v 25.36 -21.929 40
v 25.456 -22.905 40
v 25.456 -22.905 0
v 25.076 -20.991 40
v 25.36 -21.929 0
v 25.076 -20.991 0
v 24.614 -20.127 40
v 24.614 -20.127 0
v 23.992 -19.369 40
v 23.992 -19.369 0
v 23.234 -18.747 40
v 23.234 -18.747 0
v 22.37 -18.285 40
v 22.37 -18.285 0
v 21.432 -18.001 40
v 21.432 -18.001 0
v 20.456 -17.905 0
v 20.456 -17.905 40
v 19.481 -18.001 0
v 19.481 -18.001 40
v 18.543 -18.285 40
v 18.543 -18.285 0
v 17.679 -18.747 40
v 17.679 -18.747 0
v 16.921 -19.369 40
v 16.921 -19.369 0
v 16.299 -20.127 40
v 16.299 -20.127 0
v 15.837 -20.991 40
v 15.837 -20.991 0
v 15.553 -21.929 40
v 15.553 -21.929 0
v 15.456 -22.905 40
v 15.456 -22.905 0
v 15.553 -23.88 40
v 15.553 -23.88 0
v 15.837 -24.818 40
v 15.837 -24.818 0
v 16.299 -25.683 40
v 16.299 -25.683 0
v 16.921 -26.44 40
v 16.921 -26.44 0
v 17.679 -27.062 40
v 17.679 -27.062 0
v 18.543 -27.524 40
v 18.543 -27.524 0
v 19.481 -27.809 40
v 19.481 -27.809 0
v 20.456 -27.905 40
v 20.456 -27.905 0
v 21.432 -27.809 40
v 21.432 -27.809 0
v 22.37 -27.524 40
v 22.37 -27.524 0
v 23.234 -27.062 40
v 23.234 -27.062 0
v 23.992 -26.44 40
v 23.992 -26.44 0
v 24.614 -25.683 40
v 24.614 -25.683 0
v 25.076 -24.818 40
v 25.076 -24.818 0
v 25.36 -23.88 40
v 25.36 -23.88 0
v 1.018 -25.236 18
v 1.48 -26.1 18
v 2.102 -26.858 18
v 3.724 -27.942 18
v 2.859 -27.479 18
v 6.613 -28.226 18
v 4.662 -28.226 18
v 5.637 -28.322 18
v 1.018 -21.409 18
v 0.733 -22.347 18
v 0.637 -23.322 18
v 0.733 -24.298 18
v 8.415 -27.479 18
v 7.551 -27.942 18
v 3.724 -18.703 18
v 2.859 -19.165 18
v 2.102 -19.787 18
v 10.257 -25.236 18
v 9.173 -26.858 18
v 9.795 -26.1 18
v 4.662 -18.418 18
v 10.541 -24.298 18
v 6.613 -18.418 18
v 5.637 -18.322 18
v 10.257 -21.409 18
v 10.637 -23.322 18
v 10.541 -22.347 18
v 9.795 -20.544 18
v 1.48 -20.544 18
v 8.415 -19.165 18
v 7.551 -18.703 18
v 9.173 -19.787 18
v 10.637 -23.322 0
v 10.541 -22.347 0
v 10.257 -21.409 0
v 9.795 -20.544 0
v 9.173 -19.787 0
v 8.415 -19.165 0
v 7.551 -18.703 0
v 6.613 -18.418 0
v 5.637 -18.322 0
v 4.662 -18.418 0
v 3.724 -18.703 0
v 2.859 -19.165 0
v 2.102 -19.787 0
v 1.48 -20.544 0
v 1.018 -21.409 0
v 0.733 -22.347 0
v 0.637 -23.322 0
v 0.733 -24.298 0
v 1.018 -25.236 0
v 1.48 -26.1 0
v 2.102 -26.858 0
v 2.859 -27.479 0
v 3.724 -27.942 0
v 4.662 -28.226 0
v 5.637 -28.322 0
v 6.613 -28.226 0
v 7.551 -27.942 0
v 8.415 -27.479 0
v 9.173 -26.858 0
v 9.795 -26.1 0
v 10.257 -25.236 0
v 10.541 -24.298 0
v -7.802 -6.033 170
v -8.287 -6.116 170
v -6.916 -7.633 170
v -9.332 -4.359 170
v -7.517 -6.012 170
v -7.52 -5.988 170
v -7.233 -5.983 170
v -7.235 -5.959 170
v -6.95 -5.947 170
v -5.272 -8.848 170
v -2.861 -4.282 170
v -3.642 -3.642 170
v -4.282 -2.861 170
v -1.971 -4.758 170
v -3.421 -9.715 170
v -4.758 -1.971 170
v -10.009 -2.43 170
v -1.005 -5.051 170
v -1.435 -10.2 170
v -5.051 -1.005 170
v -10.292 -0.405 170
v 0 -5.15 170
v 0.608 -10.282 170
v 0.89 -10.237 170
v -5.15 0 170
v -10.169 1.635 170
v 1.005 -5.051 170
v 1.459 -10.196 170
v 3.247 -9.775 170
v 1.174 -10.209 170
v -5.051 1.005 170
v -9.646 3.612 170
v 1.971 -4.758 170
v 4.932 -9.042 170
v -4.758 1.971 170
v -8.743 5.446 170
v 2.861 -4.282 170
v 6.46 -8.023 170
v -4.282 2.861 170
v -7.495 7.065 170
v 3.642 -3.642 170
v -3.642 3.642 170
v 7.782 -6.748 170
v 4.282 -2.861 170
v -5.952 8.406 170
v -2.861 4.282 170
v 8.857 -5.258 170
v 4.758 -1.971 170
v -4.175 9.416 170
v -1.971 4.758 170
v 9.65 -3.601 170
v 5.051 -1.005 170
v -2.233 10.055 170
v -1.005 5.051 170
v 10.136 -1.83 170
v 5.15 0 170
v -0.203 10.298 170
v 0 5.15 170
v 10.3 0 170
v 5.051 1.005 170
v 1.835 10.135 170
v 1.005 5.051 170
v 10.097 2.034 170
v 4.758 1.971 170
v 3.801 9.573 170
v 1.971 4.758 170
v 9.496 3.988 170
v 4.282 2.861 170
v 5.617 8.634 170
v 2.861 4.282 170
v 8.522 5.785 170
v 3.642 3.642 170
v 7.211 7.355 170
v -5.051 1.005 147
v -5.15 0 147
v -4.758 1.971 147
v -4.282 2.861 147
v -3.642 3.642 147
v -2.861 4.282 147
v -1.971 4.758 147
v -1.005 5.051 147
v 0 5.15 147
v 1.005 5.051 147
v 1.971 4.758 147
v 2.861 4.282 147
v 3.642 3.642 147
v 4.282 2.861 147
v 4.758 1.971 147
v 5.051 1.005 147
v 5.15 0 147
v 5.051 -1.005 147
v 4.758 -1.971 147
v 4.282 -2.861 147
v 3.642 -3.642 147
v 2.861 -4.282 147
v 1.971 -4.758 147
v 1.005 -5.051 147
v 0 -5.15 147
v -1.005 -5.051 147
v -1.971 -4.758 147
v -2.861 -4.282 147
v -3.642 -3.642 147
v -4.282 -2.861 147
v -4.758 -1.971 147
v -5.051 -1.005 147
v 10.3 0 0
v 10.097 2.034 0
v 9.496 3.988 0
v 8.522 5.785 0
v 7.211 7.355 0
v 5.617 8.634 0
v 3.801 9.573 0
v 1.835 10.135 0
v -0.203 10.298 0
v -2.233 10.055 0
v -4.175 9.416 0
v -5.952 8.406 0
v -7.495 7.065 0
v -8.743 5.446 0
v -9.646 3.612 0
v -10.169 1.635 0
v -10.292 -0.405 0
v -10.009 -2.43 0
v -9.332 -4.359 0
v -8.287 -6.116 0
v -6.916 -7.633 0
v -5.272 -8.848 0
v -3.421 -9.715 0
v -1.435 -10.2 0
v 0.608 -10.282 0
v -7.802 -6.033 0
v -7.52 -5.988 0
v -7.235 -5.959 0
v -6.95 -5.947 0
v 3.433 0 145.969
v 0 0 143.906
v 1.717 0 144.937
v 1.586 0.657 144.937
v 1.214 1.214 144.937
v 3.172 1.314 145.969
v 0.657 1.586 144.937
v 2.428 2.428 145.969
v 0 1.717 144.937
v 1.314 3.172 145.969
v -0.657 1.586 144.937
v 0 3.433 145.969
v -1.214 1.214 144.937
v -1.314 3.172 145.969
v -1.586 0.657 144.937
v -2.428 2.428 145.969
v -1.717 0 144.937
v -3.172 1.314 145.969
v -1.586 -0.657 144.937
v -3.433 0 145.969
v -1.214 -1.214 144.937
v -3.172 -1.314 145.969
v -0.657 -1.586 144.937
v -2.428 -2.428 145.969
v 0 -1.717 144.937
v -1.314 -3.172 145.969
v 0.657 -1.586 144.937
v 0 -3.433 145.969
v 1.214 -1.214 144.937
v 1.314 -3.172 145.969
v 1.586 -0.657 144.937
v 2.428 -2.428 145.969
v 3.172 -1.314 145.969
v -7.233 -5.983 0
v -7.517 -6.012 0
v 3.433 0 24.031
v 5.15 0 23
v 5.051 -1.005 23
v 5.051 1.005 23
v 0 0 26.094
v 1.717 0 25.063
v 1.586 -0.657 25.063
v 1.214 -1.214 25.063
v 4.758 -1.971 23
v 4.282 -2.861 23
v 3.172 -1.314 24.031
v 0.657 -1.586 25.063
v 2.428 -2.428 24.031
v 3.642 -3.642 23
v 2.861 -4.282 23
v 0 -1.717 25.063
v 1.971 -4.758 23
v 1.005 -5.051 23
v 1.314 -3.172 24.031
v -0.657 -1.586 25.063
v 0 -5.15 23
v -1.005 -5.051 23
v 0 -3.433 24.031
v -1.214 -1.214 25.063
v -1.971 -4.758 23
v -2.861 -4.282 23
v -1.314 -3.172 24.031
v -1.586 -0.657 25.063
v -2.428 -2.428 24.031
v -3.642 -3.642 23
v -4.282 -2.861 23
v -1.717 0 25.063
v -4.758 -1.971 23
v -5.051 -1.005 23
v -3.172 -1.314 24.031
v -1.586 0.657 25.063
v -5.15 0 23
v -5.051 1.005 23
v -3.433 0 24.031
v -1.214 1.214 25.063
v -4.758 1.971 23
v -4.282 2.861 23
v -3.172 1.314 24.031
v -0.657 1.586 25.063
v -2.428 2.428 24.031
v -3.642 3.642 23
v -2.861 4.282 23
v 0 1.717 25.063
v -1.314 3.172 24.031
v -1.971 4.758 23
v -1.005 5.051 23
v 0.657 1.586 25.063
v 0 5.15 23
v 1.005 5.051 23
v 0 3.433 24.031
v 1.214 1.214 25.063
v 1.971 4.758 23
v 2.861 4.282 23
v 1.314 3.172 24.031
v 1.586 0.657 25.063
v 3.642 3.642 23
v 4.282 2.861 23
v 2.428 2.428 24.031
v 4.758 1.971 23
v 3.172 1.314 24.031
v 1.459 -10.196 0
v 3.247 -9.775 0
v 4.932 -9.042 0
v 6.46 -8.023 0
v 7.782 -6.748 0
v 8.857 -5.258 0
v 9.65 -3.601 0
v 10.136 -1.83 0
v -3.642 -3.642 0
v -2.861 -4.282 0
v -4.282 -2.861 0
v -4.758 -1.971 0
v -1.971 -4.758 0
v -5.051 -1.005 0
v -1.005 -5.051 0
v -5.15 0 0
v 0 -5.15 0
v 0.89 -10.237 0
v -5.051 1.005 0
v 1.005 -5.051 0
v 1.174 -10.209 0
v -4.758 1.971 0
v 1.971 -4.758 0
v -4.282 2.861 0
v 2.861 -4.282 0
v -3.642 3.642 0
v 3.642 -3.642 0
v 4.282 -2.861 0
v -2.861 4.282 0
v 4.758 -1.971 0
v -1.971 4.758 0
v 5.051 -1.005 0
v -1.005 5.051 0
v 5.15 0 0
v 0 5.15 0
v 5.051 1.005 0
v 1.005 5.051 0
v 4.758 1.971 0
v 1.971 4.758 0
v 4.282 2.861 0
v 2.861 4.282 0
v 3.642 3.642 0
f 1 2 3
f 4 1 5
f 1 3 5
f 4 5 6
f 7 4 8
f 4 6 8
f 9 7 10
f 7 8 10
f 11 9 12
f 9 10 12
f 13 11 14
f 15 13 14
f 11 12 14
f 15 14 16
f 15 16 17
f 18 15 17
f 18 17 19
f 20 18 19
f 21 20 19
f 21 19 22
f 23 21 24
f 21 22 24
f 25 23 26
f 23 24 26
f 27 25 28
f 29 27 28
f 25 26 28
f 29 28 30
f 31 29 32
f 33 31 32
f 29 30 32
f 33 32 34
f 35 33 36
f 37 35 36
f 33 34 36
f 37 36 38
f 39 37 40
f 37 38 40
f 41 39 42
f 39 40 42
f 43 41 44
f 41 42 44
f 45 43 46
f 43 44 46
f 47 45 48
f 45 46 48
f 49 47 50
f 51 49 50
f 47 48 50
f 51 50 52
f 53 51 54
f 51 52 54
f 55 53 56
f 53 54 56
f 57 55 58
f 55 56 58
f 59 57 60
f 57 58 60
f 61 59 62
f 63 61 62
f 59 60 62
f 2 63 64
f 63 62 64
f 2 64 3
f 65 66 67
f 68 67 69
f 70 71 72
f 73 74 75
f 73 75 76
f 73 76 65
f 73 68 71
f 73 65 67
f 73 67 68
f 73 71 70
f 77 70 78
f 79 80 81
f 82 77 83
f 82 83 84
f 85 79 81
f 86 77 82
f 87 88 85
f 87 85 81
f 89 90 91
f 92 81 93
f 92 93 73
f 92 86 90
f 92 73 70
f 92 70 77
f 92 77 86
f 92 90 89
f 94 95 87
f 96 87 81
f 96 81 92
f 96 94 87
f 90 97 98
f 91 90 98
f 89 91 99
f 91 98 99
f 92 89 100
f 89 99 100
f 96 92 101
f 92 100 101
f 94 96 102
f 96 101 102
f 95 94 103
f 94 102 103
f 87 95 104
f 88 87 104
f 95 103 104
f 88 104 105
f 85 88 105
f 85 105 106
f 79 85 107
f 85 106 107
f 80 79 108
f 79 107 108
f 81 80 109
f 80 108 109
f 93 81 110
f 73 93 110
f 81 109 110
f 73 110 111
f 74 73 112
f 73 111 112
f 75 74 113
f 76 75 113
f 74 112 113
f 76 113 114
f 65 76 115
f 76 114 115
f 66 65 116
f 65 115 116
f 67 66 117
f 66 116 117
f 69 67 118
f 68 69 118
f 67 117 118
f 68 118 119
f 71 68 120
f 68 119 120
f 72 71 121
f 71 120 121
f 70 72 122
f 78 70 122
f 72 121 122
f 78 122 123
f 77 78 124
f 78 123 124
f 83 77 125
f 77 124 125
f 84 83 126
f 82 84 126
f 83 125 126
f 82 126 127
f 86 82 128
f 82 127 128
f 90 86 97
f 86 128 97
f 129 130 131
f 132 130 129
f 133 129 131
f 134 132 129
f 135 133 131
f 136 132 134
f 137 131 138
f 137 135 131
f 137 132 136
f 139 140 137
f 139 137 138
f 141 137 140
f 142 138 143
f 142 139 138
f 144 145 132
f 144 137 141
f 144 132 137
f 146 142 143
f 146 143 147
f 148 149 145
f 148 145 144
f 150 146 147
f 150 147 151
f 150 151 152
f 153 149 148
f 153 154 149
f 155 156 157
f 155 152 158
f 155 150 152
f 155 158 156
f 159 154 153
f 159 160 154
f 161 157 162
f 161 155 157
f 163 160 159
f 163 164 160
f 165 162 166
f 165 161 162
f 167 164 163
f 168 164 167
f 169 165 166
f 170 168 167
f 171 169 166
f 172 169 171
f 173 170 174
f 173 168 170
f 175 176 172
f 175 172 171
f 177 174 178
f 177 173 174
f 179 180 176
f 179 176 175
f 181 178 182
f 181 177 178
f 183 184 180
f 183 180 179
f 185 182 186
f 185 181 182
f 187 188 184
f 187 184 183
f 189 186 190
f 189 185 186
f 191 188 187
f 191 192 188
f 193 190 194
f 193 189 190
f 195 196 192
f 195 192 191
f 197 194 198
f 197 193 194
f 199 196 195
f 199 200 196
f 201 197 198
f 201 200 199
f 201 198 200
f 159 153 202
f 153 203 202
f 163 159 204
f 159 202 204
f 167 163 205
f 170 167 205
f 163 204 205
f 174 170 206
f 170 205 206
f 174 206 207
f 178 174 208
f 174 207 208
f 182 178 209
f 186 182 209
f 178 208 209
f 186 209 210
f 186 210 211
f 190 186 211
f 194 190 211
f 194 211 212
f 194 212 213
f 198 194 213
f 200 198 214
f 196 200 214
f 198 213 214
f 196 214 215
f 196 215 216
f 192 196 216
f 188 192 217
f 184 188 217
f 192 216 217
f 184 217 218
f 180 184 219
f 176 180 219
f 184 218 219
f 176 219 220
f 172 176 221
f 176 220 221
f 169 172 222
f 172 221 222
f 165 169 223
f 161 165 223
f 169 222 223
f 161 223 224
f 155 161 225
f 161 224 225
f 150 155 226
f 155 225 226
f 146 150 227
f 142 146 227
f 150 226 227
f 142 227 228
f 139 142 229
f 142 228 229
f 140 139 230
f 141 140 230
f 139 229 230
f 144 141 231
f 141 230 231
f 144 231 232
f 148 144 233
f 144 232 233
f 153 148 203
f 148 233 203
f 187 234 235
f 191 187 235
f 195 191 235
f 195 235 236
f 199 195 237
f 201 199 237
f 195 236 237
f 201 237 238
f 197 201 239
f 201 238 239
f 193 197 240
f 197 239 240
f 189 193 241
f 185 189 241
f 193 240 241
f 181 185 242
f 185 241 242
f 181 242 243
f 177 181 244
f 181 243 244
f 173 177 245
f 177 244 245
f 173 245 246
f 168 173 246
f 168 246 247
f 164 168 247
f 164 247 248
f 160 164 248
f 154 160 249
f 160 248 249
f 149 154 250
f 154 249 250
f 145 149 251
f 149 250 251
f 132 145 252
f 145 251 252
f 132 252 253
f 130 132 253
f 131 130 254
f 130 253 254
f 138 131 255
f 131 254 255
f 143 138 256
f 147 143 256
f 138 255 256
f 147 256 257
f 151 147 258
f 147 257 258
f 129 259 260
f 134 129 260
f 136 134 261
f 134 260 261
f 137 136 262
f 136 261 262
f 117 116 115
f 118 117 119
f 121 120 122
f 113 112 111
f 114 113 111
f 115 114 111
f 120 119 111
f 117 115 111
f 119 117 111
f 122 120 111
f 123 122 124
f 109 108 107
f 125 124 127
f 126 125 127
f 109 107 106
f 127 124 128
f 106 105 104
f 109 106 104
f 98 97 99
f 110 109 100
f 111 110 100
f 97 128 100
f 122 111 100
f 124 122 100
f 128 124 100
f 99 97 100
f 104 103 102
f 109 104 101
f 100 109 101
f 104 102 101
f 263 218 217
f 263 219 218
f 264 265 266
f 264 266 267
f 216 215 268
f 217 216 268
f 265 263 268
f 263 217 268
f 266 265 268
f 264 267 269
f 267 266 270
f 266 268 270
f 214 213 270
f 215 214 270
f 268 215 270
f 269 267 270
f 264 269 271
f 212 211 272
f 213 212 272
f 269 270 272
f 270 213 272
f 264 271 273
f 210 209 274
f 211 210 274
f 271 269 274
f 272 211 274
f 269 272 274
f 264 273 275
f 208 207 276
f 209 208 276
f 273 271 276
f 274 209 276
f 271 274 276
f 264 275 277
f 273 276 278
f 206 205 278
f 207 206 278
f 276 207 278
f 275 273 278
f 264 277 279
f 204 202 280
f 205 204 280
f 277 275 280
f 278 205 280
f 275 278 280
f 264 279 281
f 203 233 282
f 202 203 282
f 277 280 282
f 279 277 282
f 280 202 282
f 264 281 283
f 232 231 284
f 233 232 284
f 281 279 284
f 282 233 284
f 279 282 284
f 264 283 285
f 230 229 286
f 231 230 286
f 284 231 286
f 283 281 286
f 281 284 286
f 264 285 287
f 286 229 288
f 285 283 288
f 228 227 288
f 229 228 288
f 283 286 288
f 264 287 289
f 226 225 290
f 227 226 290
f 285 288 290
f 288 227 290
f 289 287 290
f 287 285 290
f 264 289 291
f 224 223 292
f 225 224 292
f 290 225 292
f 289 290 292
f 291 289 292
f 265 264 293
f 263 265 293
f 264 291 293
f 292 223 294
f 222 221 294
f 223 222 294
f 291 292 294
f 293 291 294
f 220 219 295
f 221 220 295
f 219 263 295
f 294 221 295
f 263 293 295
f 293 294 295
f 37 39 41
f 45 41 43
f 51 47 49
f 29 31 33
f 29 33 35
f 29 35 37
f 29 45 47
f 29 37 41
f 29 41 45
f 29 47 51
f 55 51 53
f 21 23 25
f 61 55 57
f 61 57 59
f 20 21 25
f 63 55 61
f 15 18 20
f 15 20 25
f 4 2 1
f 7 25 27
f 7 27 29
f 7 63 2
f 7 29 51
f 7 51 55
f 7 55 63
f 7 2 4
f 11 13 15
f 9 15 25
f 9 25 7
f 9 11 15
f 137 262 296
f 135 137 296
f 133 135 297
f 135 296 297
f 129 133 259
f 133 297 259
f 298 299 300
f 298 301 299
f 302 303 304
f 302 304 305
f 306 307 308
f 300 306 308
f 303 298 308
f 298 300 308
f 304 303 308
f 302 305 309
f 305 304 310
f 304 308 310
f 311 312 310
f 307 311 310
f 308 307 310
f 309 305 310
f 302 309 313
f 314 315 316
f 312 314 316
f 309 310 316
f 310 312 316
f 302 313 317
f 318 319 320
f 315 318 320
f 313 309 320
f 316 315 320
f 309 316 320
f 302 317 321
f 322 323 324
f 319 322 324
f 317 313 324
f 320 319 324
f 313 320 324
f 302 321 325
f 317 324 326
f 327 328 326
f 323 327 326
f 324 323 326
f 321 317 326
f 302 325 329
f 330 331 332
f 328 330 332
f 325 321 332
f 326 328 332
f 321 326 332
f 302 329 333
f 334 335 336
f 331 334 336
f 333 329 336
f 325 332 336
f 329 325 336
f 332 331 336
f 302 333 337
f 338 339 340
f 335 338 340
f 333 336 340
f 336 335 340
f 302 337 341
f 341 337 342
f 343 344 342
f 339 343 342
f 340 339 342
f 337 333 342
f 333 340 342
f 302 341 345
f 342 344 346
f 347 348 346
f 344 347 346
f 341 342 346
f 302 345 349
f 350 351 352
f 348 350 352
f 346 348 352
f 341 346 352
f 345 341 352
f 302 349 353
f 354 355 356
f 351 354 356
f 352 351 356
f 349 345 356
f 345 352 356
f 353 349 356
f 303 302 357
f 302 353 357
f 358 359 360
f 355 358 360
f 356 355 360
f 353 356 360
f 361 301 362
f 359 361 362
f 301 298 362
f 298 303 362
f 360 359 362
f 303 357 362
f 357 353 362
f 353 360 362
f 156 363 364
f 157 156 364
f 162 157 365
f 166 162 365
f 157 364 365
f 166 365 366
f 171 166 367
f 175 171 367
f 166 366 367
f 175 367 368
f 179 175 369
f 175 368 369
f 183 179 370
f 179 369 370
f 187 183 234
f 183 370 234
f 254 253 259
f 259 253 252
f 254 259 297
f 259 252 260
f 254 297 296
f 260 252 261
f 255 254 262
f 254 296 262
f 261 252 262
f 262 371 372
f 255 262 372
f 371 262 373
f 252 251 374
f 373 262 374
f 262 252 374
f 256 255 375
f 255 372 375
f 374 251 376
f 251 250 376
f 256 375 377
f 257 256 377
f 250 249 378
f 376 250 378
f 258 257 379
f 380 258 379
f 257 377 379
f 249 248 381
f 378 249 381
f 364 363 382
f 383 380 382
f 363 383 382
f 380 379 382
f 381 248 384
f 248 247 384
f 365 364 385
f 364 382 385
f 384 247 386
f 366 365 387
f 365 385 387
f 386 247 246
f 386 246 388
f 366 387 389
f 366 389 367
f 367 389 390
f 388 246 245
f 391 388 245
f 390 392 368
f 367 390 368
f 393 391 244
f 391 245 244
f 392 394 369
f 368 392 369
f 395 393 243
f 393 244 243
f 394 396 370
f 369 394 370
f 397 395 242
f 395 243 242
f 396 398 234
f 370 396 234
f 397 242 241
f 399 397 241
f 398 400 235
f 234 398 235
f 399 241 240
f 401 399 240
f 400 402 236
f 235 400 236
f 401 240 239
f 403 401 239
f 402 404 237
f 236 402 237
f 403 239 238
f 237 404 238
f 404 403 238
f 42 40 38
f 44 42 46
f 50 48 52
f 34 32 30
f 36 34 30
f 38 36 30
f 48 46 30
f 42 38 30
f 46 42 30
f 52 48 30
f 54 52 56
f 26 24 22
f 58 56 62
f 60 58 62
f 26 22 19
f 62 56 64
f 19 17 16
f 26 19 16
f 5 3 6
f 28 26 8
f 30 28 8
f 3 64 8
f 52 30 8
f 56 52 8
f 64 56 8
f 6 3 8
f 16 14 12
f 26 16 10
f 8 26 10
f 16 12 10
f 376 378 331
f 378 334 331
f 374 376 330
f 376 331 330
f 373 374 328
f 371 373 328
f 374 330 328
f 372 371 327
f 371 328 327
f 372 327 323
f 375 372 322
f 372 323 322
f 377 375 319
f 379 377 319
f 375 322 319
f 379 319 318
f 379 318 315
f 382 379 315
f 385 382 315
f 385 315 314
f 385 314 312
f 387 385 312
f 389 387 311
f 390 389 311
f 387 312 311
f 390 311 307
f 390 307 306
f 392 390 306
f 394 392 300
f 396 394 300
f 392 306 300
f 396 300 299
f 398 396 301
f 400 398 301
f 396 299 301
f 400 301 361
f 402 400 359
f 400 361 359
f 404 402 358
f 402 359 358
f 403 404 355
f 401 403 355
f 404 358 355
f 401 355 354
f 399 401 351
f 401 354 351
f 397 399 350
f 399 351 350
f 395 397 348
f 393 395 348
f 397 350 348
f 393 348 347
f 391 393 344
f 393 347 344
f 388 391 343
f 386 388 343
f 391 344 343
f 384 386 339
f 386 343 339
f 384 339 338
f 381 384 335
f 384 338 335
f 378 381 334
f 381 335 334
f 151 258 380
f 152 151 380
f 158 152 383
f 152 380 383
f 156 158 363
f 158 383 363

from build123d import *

# Parameters (mm, degrees)
F4_DEPTH = 170
F0_R     = 5
F5_DEPTH = 40
F6_D     = 10.3
F6_DEPTH = 23
F6_TIP   = 3.094432188
F1_DEPTH = 18
F3_D     = 10.3
F3_DEPTH = 23
F3_TIP   = 3.094432188


# Not quite as in the source:
# - a feature names something its author has since deleted; it is built from what else it names


with BuildPart() as f4:
    # F0 (on Top) → F4 (new body)
    with BuildSketch(Plane.XY):
        with BuildLine():
            ThreePointArc((1.459339769, -10.1960937343), (7.7820691214, -6.7475477167), (10.3, 0))
            ThreePointArc((10.3, 0), (-3.1805785381, 9.7966279996), (-8.335712653, -6.0502805363))
            ThreePointArc((-8.335712653, -6.0502805363), (-4.4053069437, -9.3103851012), (0.6079003247, -10.2820453799))
            ThreePointArc((0.6079003247, -10.2820453799), (1.0317778037, -10.2208202439), (1.459339769, -10.1960937343))
        make_face()
        with BuildLine():
            ThreePointArc((-6.950166537, -5.9466386188), (-7.3749932213, -5.9984609008), (-7.8016059813, -6.0325902644))
            ThreePointArc((-7.8016059813, -6.0325902644), (-7.3777285024, -5.9713651284), (-6.950166537, -5.9466386188))
        make_face(mode=Mode.SUBTRACT)
    extrude(amount=F4_DEPTH)

    # F6
    with Locations(Plane(origin=(0, 0, 0), x_dir=(1, 0, 0), z_dir=(0, 0, -1))):
        with Locations((0, 0)):
            Hole(F6_D / 2, depth=F6_DEPTH)
            with Locations((0, 0, -(F6_DEPTH + F6_TIP / 2))):  # 118° drill point
                Cone(0, F6_D / 2, F6_TIP, mode=Mode.SUBTRACT)

    # F3
    with Locations(Plane.XY.offset(170)):
        with Locations((0, 0)):
            Hole(F3_D / 2, depth=F3_DEPTH)
            with Locations((0, 0, -(F3_DEPTH + F3_TIP / 2))):  # 118° drill point
                Cone(0, F3_D / 2, F3_TIP, mode=Mode.SUBTRACT)


with BuildPart() as f5:
    # F0 (on Top) → F5 (new body)
    with BuildSketch(Plane.XY):
        with Locations((20.4564929008, -22.9047387838)):
            Circle(F0_R)
    extrude(amount=F5_DEPTH)


with BuildPart() as f1:
    # F0 (on Top) → F1 (new body)
    with BuildSketch(Plane.XY):
        with Locations((5.6373359263, -23.3221485403)):
            Circle(F0_R)
    extrude(amount=F1_DEPTH)


solid = Compound([f4.part, f5.part, f1.part])
